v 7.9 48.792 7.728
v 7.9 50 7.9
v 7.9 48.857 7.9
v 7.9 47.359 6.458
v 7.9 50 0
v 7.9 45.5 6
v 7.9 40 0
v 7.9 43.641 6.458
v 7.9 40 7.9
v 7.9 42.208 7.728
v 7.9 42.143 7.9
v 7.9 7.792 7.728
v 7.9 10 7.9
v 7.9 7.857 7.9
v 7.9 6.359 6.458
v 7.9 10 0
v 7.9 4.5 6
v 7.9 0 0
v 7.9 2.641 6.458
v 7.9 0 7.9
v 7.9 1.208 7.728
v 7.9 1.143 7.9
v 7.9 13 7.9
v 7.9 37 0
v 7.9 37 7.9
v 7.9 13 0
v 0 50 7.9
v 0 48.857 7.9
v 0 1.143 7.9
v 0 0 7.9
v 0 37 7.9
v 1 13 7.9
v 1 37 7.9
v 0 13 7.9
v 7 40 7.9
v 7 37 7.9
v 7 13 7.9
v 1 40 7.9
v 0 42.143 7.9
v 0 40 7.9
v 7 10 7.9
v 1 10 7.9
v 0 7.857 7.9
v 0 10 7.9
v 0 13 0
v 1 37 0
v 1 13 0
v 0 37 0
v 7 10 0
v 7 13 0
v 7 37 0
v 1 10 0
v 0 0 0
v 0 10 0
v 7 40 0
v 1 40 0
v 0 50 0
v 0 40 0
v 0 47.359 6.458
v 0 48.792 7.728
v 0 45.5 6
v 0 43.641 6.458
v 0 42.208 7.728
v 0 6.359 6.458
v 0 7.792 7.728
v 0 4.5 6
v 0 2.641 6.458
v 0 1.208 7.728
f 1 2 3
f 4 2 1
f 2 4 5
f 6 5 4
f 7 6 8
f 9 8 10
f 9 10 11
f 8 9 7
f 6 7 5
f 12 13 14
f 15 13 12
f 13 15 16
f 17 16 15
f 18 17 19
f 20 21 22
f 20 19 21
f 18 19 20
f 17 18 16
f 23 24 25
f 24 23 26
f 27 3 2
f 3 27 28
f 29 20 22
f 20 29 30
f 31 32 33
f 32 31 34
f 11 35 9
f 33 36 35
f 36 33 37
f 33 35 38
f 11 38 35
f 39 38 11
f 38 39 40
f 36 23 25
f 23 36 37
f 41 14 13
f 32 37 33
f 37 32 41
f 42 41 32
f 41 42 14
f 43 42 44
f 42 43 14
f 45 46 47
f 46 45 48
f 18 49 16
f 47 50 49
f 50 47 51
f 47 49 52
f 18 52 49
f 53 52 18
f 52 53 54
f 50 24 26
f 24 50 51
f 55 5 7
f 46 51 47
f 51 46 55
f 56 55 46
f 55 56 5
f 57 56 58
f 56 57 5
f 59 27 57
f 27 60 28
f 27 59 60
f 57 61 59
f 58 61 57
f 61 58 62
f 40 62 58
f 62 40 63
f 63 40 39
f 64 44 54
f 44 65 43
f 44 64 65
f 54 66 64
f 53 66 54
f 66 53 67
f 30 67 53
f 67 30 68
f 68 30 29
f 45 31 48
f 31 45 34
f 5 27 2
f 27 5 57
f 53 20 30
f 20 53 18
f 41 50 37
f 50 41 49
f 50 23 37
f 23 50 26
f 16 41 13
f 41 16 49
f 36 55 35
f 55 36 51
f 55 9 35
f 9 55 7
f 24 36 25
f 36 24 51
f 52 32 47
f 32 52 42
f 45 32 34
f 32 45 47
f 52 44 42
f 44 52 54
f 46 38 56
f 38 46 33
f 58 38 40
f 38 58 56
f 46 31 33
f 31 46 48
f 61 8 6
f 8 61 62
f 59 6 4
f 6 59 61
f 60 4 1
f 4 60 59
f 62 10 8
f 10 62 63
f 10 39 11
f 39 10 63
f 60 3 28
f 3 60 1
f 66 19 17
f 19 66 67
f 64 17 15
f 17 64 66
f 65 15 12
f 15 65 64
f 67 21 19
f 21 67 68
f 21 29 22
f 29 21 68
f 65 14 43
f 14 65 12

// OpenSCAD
longueur= 50;

difference() {
    cube([7.9,longueur,7.9]);
    translate([17,(longueur-27)/2,0]) cube([20,3,20], center = true);
    translate([17,(longueur+27)/2,0]) cube([20,3,20], center = true);
    translate([-9,(longueur-27)/2,0]) cube([20,3,20], center = true);
    translate([-9,(longueur+27)/2,0]) cube([20,3,20], center = true);
    
    translate([0,(longueur+27)/2+7,10])
    rotate([0,90,0])
    cylinder(r=4,h=20, center=true);

    translate([0,(longueur-27)/2-7,10])
    rotate([0,90,0])
    cylinder(r=4,h=20, center=true);
}
